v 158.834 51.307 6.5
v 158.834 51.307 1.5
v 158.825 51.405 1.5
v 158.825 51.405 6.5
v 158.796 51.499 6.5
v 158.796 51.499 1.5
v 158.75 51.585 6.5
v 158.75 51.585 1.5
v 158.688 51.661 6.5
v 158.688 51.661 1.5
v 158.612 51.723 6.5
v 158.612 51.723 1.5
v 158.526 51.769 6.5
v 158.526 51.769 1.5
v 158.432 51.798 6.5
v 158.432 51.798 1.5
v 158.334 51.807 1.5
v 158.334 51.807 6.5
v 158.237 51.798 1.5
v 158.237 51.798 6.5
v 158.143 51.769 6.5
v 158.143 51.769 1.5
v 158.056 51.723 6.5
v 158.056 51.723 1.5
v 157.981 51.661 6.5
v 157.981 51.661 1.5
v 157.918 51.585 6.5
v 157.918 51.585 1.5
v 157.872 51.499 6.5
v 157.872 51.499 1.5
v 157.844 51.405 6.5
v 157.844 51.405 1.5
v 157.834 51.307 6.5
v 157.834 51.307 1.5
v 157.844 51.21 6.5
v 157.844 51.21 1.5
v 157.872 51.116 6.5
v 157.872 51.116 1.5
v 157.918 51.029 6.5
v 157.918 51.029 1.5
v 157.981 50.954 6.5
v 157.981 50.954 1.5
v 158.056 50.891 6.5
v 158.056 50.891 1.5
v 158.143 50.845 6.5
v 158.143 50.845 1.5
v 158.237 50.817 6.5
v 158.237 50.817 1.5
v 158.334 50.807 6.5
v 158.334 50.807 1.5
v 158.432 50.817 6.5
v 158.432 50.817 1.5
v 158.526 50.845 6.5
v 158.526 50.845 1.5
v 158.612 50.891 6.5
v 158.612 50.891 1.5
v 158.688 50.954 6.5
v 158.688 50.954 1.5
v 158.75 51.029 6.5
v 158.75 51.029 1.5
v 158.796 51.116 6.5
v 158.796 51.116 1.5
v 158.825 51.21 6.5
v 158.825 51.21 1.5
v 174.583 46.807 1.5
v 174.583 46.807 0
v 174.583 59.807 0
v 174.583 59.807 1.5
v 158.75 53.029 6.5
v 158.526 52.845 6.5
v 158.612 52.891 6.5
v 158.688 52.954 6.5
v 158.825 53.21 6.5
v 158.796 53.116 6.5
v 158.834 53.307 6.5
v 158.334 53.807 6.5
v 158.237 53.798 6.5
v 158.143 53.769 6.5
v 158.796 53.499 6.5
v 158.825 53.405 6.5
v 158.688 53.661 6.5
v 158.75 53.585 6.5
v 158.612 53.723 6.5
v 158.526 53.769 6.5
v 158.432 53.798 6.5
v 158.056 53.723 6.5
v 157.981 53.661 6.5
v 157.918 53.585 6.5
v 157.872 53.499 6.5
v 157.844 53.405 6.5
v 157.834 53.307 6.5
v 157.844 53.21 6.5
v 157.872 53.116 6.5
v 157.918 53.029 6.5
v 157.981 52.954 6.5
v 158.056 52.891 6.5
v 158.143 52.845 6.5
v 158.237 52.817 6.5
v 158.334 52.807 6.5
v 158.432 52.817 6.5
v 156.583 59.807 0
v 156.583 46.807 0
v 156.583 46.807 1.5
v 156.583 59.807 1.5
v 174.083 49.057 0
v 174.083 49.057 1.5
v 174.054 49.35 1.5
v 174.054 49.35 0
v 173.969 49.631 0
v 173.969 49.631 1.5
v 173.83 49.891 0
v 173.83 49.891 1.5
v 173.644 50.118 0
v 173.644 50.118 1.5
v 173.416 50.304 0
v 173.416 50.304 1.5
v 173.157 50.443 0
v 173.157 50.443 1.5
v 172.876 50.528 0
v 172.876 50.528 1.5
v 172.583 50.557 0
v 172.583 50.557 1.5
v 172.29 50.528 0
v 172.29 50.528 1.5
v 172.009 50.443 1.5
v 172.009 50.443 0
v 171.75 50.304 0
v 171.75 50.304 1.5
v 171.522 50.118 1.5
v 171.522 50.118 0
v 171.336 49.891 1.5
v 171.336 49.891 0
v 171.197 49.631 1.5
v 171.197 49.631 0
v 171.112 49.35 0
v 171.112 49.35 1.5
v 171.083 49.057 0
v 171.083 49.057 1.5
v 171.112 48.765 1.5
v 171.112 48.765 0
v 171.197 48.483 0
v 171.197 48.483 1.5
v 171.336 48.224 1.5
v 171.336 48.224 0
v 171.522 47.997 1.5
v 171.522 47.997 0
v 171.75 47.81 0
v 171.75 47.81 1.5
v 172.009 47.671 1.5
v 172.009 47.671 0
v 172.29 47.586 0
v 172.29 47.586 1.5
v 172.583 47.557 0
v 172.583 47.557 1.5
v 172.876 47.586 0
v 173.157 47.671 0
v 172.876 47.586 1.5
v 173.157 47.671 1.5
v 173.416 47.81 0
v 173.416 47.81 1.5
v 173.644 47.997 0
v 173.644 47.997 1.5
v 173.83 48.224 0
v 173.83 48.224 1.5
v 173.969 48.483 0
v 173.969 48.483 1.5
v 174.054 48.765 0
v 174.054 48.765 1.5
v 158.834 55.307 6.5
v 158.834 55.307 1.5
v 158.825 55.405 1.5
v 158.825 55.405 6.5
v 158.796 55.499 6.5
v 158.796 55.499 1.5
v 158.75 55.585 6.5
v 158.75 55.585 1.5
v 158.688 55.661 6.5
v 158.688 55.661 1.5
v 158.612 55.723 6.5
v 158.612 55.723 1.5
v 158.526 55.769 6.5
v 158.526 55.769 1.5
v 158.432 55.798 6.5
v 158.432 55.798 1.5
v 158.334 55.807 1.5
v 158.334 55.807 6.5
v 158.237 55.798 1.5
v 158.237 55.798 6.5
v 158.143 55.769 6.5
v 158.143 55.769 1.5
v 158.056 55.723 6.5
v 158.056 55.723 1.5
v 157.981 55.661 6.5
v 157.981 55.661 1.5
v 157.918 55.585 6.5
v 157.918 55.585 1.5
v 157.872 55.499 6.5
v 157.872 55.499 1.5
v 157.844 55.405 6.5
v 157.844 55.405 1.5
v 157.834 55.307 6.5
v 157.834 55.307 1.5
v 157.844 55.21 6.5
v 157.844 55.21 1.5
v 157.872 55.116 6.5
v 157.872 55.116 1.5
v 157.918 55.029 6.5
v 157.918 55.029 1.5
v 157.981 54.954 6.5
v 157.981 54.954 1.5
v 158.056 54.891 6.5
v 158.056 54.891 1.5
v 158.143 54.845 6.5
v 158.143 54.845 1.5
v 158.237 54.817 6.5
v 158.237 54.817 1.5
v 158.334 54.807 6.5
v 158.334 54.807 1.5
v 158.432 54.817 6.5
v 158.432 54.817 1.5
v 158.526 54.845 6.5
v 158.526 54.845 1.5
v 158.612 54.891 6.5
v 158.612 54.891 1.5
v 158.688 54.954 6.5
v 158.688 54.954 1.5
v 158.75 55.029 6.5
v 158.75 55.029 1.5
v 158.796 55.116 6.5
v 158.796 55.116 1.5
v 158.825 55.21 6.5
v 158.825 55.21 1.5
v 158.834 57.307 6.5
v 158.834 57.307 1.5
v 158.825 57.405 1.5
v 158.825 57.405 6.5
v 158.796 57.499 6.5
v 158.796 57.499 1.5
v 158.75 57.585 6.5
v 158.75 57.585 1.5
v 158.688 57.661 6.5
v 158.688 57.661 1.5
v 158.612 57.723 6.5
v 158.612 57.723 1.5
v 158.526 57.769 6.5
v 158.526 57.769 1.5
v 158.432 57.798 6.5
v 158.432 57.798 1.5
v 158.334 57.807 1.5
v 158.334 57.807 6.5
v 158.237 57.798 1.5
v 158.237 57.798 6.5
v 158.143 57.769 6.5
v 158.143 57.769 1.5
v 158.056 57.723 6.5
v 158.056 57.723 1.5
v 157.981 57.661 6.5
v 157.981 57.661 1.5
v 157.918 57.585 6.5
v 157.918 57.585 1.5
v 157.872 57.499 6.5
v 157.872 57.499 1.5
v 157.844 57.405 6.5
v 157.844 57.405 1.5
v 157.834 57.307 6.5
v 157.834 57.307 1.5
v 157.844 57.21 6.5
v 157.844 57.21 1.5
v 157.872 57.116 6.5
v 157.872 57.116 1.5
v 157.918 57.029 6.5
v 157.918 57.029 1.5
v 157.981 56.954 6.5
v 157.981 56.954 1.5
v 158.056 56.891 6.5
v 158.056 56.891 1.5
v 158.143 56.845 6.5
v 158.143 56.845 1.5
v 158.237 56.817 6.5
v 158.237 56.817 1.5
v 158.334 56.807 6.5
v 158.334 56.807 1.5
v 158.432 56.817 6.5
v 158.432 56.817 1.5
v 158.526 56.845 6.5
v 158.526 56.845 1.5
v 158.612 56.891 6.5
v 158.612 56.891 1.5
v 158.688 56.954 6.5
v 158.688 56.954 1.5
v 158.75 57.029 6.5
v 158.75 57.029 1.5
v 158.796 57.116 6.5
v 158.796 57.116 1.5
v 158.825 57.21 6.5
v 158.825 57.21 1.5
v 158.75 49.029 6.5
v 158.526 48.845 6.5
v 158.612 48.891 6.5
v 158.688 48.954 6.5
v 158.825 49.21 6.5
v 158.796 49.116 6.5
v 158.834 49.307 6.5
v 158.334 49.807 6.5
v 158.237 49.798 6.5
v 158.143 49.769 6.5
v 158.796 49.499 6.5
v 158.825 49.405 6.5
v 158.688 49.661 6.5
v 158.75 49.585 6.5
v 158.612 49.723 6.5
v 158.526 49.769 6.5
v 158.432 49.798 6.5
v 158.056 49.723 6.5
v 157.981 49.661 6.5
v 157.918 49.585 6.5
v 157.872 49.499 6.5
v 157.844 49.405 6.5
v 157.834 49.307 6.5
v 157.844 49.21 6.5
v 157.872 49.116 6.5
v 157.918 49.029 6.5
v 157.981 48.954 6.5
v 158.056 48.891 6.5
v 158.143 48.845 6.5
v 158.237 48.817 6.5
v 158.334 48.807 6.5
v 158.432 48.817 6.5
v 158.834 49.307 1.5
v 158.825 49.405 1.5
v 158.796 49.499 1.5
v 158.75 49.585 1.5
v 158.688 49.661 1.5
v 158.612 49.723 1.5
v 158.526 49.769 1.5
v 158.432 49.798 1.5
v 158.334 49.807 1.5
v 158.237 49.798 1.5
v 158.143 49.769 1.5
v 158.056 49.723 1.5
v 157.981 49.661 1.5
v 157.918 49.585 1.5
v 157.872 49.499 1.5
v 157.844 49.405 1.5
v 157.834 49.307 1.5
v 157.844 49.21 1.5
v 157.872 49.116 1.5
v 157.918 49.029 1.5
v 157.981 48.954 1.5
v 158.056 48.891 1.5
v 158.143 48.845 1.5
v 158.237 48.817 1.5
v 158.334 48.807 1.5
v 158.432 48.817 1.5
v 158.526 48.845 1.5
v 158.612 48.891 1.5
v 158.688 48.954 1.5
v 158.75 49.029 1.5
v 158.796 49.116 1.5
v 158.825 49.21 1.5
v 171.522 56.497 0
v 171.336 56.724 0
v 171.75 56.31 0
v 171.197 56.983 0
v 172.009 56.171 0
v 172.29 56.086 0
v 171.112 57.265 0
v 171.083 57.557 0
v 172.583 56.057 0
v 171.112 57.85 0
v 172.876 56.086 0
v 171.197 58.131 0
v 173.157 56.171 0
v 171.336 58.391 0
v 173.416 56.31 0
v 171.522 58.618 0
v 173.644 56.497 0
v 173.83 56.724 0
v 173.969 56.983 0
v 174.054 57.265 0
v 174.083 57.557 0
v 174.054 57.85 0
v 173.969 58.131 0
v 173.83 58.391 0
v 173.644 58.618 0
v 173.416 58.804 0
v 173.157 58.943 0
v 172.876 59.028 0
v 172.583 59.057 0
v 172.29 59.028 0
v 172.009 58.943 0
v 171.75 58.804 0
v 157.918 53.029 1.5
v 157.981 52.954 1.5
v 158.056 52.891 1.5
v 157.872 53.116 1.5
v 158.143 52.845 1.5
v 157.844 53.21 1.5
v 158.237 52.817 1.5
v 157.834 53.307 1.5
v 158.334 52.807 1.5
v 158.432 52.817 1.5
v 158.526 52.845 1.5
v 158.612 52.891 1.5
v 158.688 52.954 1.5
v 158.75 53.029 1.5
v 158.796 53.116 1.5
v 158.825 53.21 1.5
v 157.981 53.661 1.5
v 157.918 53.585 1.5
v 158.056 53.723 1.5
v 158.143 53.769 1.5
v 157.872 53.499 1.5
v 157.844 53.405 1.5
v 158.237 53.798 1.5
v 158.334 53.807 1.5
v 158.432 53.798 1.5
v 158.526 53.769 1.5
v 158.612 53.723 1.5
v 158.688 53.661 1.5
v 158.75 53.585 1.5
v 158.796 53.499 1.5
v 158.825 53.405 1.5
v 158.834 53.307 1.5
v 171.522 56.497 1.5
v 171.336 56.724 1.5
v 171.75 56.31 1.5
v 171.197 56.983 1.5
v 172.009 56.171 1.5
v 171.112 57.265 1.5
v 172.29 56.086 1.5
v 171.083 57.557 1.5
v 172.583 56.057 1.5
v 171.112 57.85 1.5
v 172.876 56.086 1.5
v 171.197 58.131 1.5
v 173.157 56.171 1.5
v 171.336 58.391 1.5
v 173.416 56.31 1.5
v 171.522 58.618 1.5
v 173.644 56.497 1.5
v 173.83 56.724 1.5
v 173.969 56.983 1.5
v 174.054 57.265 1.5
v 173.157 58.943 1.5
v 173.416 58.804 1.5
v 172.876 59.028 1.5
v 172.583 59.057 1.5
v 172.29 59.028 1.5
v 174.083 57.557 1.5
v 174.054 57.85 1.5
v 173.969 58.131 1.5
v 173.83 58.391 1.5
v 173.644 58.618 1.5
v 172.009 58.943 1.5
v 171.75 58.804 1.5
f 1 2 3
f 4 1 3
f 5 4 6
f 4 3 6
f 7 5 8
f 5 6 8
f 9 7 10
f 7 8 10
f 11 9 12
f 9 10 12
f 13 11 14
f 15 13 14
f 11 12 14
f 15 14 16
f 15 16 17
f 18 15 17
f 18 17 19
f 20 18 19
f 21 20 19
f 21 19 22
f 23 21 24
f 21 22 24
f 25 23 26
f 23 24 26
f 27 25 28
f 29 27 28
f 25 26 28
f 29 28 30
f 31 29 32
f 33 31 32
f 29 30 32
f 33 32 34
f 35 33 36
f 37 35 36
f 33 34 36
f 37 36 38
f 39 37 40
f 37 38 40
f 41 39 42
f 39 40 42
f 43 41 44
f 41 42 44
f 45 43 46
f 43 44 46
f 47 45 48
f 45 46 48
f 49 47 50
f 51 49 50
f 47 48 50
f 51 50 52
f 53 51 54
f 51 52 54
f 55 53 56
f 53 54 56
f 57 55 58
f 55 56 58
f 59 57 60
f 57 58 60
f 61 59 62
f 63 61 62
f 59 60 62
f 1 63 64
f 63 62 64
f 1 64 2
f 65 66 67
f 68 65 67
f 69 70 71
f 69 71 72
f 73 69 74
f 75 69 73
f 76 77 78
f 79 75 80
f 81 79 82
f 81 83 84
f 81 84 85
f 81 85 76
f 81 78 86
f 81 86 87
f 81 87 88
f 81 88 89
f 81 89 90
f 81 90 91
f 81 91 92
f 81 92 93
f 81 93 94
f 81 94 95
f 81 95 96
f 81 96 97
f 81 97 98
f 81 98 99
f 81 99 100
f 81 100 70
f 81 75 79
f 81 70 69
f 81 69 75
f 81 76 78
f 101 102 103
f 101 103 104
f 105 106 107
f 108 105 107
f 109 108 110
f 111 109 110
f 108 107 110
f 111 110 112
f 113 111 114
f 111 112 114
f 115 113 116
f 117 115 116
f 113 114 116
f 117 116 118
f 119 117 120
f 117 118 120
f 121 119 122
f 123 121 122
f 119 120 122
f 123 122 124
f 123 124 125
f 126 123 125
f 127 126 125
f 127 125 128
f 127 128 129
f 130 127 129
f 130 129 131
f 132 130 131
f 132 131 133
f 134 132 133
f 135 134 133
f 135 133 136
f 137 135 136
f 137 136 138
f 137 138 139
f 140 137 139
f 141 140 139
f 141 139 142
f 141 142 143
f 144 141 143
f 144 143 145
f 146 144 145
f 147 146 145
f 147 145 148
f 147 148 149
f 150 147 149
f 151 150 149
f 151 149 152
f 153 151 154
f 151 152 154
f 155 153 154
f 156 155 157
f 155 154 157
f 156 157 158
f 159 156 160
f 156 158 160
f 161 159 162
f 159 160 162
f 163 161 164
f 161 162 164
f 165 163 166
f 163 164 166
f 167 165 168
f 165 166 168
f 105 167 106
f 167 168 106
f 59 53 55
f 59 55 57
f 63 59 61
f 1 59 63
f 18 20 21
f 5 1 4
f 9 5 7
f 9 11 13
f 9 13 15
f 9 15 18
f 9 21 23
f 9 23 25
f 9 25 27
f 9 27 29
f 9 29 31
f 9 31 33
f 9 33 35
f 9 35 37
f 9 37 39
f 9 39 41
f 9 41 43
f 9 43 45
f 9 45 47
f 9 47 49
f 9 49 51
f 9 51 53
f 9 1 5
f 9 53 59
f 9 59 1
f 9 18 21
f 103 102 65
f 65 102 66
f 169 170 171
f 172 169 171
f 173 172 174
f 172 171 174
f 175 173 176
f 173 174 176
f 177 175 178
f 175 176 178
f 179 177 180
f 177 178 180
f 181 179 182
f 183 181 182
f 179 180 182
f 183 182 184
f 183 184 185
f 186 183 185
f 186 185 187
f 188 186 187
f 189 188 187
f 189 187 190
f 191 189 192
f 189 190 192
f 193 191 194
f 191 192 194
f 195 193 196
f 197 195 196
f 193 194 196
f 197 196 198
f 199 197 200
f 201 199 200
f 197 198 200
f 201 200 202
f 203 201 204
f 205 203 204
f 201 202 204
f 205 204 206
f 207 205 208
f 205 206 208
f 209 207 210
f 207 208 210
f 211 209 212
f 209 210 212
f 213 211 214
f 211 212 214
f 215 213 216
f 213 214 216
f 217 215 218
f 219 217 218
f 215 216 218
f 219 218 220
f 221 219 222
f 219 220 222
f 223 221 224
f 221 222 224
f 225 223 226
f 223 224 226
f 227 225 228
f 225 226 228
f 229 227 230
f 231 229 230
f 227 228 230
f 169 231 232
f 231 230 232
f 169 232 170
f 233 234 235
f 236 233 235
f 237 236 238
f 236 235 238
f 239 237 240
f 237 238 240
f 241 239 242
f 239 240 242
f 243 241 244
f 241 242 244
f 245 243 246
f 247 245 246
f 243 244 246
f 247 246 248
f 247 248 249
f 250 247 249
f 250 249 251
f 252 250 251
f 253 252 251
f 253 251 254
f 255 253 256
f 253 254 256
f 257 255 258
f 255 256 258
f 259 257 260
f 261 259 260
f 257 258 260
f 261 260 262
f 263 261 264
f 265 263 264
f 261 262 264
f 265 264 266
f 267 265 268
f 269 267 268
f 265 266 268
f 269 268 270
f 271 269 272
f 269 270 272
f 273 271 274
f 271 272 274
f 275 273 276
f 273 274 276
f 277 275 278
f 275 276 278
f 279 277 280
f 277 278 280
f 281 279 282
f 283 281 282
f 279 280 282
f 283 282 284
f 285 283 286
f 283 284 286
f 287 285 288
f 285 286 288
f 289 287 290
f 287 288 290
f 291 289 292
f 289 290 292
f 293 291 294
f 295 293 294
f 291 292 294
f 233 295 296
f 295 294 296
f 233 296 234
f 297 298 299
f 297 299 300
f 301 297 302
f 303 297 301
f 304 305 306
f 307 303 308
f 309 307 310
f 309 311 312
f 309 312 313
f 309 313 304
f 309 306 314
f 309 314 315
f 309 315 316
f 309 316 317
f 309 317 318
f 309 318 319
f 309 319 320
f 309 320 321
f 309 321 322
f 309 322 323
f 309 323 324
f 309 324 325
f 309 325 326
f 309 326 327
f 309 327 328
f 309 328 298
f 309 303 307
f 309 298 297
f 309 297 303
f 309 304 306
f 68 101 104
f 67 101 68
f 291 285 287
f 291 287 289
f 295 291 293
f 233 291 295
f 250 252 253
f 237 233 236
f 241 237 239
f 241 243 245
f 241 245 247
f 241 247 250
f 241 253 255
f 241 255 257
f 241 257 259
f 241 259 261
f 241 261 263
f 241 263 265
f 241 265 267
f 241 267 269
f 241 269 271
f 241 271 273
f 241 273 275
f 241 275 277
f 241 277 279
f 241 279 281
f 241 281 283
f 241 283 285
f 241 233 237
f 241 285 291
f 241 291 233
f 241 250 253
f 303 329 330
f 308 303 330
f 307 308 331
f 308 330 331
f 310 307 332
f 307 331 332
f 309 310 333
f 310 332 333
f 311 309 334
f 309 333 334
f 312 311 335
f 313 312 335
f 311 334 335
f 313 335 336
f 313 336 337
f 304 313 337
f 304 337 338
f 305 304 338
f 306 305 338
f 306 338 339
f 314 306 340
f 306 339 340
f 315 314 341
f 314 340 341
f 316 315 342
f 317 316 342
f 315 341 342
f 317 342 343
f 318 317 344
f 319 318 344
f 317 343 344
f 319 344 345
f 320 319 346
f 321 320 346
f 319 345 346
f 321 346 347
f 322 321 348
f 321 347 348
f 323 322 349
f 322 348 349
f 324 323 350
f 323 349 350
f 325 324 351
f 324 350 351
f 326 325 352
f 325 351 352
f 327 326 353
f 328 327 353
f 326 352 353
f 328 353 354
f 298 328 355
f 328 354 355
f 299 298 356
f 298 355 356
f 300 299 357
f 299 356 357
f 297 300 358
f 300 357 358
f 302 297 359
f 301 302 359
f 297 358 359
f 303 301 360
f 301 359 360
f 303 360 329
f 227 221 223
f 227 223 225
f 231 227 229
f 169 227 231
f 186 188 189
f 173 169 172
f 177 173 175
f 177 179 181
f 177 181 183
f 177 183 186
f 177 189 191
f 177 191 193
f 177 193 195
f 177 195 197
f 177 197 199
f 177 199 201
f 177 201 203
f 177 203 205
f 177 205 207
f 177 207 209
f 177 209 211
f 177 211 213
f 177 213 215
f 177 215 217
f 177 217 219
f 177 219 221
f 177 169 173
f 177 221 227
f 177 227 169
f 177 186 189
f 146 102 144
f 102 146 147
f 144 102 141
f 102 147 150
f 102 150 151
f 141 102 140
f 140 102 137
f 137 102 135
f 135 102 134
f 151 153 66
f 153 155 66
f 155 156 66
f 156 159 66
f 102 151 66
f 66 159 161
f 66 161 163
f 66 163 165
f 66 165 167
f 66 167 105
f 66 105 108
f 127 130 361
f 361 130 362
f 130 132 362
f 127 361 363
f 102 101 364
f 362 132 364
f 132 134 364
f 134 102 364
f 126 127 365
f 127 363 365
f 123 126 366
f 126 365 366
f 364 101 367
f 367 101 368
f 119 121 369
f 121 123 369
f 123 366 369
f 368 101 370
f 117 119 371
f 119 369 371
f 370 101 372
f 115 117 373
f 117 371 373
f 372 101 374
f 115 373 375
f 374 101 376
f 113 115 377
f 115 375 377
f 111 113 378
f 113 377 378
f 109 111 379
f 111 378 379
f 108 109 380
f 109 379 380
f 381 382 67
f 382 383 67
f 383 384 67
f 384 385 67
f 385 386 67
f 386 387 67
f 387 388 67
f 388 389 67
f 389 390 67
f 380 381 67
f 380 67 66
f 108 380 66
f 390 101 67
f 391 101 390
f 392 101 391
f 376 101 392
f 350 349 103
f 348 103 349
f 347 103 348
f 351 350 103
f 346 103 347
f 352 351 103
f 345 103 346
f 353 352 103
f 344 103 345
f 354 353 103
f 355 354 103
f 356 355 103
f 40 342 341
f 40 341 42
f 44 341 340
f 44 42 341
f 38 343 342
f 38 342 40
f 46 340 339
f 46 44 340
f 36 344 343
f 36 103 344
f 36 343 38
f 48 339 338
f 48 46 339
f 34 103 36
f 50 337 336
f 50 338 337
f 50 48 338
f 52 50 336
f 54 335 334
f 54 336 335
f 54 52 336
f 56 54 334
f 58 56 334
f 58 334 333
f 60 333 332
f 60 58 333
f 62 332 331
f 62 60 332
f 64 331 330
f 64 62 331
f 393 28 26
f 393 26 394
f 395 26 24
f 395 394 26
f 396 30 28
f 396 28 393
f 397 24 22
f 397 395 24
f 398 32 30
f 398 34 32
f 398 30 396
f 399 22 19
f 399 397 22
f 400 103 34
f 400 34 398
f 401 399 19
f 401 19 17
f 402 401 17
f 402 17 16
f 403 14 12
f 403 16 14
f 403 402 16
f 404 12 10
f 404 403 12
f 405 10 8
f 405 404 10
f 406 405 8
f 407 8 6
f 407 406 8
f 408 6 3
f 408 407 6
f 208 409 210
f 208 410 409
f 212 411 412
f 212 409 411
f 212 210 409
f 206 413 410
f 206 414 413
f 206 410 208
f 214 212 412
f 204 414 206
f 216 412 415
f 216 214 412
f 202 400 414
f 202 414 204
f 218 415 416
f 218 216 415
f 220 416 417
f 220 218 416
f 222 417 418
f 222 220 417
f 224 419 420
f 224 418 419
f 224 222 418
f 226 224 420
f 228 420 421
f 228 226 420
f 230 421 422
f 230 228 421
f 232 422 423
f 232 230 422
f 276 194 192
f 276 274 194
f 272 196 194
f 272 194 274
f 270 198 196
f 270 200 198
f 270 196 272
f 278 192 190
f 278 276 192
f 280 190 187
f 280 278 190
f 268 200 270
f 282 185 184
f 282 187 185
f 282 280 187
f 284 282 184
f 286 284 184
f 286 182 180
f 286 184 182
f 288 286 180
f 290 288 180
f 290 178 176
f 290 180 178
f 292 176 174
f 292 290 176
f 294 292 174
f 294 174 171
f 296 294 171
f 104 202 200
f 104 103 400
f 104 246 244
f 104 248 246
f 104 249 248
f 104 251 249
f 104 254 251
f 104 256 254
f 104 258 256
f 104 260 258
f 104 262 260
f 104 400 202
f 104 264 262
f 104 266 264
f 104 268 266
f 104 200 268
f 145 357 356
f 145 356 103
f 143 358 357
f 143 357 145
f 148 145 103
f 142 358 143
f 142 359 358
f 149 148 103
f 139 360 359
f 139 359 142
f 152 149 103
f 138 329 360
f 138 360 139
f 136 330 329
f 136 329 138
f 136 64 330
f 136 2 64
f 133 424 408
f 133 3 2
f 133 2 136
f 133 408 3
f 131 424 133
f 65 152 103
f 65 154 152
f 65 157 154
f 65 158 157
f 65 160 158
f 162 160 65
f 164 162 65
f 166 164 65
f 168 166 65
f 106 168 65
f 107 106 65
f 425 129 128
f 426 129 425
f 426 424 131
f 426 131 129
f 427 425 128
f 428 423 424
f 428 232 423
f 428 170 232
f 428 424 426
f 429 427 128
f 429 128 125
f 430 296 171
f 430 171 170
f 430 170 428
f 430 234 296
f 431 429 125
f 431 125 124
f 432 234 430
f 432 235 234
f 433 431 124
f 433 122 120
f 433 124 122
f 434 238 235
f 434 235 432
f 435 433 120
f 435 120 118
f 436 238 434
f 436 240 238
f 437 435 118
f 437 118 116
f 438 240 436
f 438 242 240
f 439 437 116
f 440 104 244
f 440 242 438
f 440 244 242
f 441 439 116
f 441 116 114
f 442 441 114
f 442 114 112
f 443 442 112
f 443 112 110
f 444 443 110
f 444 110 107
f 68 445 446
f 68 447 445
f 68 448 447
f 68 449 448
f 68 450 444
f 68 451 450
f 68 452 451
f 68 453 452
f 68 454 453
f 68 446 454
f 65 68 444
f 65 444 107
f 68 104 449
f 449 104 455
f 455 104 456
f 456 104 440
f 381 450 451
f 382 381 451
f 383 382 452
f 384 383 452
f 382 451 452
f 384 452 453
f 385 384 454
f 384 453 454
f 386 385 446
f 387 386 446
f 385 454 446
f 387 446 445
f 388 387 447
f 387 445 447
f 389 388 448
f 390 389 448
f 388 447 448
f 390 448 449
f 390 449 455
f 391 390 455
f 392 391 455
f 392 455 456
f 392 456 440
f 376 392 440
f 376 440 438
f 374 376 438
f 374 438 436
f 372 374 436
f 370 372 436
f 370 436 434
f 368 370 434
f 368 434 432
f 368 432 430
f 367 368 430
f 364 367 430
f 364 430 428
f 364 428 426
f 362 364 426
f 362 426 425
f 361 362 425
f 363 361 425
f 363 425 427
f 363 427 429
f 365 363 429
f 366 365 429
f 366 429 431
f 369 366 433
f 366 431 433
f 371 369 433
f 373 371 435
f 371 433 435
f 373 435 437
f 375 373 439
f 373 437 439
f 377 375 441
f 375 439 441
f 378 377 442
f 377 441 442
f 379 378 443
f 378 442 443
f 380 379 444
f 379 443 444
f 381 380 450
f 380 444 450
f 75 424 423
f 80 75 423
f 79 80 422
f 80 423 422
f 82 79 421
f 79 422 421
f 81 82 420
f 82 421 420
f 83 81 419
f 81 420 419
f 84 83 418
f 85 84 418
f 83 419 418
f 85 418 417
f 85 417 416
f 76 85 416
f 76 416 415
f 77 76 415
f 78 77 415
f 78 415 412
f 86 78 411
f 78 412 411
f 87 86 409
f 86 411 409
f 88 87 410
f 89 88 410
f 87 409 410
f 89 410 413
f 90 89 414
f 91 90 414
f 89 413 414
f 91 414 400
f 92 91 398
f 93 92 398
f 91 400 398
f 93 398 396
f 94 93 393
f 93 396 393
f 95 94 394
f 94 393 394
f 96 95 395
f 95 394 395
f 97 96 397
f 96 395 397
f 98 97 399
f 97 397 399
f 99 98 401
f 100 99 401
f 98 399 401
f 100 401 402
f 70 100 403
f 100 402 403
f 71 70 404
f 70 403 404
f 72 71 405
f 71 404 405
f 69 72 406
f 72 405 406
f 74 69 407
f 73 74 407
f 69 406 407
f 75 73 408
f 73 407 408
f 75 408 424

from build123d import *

# Parameters (mm, degrees)
SKETCH1_W           = 18
SKETCH1_H           = 13
BOSS_EXTRUDE1_DEPTH = 1.5
SKETCH2_R           = 0.5
BOSS_EXTRUDE2_DEPTH = 5
CUT_EXTRUDE1_REACH  = 3.5
SKETCH3_R           = 1.5


with BuildPart() as part:
    # Sketch1 → Boss-Extrude1 (new body)
    with BuildSketch(Plane.XY):
        with Locations((165.583059714, 53.307197022)):
            Rectangle(SKETCH1_W, SKETCH1_H)
    extrude(amount=BOSS_EXTRUDE1_DEPTH)

    # Sketch2 → Boss-Extrude2 (add)
    with BuildSketch(Plane.XY.offset(1.5)):
        with Locations((158.334176002, 53.307197022)):
            Circle(SKETCH2_R)
        with Locations((158.334176002, 55.307197022)):
            Circle(SKETCH2_R)
        with Locations((158.334176002, 57.307197022)):
            Circle(SKETCH2_R)
        with Locations((158.334176002, 51.307197022)):
            Circle(SKETCH2_R)
        with Locations((158.334176002, 49.307197022)):
            Circle(SKETCH2_R)
    extrude(amount=BOSS_EXTRUDE2_DEPTH)

    # Sketch3 → Cut-Extrude1 (cut, up to next)
    with BuildSketch(Plane.XY.offset(1.5), mode=Mode.PRIVATE) as cut_extrude1_sk1:
        with Locations((172.583059714, 57.557197022)):
            Circle(SKETCH3_R)
    cut_extrude1_tool1 = extrude(cut_extrude1_sk1.sketch, amount=-CUT_EXTRUDE1_REACH, mode=Mode.PRIVATE) & part.part
    add(cut_extrude1_tool1.solids().sort_by_distance((172.58306, 57.557197, 1.5))[0], mode=Mode.SUBTRACT)
    # Sketch3 → Cut-Extrude1 (cut, up to next)
    with BuildSketch(Plane.XY.offset(1.5), mode=Mode.PRIVATE) as cut_extrude1_sk2:
        with Locations((172.583059714, 49.057197022)):
            Circle(SKETCH3_R)
    cut_extrude1_tool2 = extrude(cut_extrude1_sk2.sketch, amount=-CUT_EXTRUDE1_REACH, mode=Mode.PRIVATE) & part.part
    add(cut_extrude1_tool2.solids().sort_by_distance((172.58306, 49.057197, 1.5))[0], mode=Mode.SUBTRACT)


solid = part.part
